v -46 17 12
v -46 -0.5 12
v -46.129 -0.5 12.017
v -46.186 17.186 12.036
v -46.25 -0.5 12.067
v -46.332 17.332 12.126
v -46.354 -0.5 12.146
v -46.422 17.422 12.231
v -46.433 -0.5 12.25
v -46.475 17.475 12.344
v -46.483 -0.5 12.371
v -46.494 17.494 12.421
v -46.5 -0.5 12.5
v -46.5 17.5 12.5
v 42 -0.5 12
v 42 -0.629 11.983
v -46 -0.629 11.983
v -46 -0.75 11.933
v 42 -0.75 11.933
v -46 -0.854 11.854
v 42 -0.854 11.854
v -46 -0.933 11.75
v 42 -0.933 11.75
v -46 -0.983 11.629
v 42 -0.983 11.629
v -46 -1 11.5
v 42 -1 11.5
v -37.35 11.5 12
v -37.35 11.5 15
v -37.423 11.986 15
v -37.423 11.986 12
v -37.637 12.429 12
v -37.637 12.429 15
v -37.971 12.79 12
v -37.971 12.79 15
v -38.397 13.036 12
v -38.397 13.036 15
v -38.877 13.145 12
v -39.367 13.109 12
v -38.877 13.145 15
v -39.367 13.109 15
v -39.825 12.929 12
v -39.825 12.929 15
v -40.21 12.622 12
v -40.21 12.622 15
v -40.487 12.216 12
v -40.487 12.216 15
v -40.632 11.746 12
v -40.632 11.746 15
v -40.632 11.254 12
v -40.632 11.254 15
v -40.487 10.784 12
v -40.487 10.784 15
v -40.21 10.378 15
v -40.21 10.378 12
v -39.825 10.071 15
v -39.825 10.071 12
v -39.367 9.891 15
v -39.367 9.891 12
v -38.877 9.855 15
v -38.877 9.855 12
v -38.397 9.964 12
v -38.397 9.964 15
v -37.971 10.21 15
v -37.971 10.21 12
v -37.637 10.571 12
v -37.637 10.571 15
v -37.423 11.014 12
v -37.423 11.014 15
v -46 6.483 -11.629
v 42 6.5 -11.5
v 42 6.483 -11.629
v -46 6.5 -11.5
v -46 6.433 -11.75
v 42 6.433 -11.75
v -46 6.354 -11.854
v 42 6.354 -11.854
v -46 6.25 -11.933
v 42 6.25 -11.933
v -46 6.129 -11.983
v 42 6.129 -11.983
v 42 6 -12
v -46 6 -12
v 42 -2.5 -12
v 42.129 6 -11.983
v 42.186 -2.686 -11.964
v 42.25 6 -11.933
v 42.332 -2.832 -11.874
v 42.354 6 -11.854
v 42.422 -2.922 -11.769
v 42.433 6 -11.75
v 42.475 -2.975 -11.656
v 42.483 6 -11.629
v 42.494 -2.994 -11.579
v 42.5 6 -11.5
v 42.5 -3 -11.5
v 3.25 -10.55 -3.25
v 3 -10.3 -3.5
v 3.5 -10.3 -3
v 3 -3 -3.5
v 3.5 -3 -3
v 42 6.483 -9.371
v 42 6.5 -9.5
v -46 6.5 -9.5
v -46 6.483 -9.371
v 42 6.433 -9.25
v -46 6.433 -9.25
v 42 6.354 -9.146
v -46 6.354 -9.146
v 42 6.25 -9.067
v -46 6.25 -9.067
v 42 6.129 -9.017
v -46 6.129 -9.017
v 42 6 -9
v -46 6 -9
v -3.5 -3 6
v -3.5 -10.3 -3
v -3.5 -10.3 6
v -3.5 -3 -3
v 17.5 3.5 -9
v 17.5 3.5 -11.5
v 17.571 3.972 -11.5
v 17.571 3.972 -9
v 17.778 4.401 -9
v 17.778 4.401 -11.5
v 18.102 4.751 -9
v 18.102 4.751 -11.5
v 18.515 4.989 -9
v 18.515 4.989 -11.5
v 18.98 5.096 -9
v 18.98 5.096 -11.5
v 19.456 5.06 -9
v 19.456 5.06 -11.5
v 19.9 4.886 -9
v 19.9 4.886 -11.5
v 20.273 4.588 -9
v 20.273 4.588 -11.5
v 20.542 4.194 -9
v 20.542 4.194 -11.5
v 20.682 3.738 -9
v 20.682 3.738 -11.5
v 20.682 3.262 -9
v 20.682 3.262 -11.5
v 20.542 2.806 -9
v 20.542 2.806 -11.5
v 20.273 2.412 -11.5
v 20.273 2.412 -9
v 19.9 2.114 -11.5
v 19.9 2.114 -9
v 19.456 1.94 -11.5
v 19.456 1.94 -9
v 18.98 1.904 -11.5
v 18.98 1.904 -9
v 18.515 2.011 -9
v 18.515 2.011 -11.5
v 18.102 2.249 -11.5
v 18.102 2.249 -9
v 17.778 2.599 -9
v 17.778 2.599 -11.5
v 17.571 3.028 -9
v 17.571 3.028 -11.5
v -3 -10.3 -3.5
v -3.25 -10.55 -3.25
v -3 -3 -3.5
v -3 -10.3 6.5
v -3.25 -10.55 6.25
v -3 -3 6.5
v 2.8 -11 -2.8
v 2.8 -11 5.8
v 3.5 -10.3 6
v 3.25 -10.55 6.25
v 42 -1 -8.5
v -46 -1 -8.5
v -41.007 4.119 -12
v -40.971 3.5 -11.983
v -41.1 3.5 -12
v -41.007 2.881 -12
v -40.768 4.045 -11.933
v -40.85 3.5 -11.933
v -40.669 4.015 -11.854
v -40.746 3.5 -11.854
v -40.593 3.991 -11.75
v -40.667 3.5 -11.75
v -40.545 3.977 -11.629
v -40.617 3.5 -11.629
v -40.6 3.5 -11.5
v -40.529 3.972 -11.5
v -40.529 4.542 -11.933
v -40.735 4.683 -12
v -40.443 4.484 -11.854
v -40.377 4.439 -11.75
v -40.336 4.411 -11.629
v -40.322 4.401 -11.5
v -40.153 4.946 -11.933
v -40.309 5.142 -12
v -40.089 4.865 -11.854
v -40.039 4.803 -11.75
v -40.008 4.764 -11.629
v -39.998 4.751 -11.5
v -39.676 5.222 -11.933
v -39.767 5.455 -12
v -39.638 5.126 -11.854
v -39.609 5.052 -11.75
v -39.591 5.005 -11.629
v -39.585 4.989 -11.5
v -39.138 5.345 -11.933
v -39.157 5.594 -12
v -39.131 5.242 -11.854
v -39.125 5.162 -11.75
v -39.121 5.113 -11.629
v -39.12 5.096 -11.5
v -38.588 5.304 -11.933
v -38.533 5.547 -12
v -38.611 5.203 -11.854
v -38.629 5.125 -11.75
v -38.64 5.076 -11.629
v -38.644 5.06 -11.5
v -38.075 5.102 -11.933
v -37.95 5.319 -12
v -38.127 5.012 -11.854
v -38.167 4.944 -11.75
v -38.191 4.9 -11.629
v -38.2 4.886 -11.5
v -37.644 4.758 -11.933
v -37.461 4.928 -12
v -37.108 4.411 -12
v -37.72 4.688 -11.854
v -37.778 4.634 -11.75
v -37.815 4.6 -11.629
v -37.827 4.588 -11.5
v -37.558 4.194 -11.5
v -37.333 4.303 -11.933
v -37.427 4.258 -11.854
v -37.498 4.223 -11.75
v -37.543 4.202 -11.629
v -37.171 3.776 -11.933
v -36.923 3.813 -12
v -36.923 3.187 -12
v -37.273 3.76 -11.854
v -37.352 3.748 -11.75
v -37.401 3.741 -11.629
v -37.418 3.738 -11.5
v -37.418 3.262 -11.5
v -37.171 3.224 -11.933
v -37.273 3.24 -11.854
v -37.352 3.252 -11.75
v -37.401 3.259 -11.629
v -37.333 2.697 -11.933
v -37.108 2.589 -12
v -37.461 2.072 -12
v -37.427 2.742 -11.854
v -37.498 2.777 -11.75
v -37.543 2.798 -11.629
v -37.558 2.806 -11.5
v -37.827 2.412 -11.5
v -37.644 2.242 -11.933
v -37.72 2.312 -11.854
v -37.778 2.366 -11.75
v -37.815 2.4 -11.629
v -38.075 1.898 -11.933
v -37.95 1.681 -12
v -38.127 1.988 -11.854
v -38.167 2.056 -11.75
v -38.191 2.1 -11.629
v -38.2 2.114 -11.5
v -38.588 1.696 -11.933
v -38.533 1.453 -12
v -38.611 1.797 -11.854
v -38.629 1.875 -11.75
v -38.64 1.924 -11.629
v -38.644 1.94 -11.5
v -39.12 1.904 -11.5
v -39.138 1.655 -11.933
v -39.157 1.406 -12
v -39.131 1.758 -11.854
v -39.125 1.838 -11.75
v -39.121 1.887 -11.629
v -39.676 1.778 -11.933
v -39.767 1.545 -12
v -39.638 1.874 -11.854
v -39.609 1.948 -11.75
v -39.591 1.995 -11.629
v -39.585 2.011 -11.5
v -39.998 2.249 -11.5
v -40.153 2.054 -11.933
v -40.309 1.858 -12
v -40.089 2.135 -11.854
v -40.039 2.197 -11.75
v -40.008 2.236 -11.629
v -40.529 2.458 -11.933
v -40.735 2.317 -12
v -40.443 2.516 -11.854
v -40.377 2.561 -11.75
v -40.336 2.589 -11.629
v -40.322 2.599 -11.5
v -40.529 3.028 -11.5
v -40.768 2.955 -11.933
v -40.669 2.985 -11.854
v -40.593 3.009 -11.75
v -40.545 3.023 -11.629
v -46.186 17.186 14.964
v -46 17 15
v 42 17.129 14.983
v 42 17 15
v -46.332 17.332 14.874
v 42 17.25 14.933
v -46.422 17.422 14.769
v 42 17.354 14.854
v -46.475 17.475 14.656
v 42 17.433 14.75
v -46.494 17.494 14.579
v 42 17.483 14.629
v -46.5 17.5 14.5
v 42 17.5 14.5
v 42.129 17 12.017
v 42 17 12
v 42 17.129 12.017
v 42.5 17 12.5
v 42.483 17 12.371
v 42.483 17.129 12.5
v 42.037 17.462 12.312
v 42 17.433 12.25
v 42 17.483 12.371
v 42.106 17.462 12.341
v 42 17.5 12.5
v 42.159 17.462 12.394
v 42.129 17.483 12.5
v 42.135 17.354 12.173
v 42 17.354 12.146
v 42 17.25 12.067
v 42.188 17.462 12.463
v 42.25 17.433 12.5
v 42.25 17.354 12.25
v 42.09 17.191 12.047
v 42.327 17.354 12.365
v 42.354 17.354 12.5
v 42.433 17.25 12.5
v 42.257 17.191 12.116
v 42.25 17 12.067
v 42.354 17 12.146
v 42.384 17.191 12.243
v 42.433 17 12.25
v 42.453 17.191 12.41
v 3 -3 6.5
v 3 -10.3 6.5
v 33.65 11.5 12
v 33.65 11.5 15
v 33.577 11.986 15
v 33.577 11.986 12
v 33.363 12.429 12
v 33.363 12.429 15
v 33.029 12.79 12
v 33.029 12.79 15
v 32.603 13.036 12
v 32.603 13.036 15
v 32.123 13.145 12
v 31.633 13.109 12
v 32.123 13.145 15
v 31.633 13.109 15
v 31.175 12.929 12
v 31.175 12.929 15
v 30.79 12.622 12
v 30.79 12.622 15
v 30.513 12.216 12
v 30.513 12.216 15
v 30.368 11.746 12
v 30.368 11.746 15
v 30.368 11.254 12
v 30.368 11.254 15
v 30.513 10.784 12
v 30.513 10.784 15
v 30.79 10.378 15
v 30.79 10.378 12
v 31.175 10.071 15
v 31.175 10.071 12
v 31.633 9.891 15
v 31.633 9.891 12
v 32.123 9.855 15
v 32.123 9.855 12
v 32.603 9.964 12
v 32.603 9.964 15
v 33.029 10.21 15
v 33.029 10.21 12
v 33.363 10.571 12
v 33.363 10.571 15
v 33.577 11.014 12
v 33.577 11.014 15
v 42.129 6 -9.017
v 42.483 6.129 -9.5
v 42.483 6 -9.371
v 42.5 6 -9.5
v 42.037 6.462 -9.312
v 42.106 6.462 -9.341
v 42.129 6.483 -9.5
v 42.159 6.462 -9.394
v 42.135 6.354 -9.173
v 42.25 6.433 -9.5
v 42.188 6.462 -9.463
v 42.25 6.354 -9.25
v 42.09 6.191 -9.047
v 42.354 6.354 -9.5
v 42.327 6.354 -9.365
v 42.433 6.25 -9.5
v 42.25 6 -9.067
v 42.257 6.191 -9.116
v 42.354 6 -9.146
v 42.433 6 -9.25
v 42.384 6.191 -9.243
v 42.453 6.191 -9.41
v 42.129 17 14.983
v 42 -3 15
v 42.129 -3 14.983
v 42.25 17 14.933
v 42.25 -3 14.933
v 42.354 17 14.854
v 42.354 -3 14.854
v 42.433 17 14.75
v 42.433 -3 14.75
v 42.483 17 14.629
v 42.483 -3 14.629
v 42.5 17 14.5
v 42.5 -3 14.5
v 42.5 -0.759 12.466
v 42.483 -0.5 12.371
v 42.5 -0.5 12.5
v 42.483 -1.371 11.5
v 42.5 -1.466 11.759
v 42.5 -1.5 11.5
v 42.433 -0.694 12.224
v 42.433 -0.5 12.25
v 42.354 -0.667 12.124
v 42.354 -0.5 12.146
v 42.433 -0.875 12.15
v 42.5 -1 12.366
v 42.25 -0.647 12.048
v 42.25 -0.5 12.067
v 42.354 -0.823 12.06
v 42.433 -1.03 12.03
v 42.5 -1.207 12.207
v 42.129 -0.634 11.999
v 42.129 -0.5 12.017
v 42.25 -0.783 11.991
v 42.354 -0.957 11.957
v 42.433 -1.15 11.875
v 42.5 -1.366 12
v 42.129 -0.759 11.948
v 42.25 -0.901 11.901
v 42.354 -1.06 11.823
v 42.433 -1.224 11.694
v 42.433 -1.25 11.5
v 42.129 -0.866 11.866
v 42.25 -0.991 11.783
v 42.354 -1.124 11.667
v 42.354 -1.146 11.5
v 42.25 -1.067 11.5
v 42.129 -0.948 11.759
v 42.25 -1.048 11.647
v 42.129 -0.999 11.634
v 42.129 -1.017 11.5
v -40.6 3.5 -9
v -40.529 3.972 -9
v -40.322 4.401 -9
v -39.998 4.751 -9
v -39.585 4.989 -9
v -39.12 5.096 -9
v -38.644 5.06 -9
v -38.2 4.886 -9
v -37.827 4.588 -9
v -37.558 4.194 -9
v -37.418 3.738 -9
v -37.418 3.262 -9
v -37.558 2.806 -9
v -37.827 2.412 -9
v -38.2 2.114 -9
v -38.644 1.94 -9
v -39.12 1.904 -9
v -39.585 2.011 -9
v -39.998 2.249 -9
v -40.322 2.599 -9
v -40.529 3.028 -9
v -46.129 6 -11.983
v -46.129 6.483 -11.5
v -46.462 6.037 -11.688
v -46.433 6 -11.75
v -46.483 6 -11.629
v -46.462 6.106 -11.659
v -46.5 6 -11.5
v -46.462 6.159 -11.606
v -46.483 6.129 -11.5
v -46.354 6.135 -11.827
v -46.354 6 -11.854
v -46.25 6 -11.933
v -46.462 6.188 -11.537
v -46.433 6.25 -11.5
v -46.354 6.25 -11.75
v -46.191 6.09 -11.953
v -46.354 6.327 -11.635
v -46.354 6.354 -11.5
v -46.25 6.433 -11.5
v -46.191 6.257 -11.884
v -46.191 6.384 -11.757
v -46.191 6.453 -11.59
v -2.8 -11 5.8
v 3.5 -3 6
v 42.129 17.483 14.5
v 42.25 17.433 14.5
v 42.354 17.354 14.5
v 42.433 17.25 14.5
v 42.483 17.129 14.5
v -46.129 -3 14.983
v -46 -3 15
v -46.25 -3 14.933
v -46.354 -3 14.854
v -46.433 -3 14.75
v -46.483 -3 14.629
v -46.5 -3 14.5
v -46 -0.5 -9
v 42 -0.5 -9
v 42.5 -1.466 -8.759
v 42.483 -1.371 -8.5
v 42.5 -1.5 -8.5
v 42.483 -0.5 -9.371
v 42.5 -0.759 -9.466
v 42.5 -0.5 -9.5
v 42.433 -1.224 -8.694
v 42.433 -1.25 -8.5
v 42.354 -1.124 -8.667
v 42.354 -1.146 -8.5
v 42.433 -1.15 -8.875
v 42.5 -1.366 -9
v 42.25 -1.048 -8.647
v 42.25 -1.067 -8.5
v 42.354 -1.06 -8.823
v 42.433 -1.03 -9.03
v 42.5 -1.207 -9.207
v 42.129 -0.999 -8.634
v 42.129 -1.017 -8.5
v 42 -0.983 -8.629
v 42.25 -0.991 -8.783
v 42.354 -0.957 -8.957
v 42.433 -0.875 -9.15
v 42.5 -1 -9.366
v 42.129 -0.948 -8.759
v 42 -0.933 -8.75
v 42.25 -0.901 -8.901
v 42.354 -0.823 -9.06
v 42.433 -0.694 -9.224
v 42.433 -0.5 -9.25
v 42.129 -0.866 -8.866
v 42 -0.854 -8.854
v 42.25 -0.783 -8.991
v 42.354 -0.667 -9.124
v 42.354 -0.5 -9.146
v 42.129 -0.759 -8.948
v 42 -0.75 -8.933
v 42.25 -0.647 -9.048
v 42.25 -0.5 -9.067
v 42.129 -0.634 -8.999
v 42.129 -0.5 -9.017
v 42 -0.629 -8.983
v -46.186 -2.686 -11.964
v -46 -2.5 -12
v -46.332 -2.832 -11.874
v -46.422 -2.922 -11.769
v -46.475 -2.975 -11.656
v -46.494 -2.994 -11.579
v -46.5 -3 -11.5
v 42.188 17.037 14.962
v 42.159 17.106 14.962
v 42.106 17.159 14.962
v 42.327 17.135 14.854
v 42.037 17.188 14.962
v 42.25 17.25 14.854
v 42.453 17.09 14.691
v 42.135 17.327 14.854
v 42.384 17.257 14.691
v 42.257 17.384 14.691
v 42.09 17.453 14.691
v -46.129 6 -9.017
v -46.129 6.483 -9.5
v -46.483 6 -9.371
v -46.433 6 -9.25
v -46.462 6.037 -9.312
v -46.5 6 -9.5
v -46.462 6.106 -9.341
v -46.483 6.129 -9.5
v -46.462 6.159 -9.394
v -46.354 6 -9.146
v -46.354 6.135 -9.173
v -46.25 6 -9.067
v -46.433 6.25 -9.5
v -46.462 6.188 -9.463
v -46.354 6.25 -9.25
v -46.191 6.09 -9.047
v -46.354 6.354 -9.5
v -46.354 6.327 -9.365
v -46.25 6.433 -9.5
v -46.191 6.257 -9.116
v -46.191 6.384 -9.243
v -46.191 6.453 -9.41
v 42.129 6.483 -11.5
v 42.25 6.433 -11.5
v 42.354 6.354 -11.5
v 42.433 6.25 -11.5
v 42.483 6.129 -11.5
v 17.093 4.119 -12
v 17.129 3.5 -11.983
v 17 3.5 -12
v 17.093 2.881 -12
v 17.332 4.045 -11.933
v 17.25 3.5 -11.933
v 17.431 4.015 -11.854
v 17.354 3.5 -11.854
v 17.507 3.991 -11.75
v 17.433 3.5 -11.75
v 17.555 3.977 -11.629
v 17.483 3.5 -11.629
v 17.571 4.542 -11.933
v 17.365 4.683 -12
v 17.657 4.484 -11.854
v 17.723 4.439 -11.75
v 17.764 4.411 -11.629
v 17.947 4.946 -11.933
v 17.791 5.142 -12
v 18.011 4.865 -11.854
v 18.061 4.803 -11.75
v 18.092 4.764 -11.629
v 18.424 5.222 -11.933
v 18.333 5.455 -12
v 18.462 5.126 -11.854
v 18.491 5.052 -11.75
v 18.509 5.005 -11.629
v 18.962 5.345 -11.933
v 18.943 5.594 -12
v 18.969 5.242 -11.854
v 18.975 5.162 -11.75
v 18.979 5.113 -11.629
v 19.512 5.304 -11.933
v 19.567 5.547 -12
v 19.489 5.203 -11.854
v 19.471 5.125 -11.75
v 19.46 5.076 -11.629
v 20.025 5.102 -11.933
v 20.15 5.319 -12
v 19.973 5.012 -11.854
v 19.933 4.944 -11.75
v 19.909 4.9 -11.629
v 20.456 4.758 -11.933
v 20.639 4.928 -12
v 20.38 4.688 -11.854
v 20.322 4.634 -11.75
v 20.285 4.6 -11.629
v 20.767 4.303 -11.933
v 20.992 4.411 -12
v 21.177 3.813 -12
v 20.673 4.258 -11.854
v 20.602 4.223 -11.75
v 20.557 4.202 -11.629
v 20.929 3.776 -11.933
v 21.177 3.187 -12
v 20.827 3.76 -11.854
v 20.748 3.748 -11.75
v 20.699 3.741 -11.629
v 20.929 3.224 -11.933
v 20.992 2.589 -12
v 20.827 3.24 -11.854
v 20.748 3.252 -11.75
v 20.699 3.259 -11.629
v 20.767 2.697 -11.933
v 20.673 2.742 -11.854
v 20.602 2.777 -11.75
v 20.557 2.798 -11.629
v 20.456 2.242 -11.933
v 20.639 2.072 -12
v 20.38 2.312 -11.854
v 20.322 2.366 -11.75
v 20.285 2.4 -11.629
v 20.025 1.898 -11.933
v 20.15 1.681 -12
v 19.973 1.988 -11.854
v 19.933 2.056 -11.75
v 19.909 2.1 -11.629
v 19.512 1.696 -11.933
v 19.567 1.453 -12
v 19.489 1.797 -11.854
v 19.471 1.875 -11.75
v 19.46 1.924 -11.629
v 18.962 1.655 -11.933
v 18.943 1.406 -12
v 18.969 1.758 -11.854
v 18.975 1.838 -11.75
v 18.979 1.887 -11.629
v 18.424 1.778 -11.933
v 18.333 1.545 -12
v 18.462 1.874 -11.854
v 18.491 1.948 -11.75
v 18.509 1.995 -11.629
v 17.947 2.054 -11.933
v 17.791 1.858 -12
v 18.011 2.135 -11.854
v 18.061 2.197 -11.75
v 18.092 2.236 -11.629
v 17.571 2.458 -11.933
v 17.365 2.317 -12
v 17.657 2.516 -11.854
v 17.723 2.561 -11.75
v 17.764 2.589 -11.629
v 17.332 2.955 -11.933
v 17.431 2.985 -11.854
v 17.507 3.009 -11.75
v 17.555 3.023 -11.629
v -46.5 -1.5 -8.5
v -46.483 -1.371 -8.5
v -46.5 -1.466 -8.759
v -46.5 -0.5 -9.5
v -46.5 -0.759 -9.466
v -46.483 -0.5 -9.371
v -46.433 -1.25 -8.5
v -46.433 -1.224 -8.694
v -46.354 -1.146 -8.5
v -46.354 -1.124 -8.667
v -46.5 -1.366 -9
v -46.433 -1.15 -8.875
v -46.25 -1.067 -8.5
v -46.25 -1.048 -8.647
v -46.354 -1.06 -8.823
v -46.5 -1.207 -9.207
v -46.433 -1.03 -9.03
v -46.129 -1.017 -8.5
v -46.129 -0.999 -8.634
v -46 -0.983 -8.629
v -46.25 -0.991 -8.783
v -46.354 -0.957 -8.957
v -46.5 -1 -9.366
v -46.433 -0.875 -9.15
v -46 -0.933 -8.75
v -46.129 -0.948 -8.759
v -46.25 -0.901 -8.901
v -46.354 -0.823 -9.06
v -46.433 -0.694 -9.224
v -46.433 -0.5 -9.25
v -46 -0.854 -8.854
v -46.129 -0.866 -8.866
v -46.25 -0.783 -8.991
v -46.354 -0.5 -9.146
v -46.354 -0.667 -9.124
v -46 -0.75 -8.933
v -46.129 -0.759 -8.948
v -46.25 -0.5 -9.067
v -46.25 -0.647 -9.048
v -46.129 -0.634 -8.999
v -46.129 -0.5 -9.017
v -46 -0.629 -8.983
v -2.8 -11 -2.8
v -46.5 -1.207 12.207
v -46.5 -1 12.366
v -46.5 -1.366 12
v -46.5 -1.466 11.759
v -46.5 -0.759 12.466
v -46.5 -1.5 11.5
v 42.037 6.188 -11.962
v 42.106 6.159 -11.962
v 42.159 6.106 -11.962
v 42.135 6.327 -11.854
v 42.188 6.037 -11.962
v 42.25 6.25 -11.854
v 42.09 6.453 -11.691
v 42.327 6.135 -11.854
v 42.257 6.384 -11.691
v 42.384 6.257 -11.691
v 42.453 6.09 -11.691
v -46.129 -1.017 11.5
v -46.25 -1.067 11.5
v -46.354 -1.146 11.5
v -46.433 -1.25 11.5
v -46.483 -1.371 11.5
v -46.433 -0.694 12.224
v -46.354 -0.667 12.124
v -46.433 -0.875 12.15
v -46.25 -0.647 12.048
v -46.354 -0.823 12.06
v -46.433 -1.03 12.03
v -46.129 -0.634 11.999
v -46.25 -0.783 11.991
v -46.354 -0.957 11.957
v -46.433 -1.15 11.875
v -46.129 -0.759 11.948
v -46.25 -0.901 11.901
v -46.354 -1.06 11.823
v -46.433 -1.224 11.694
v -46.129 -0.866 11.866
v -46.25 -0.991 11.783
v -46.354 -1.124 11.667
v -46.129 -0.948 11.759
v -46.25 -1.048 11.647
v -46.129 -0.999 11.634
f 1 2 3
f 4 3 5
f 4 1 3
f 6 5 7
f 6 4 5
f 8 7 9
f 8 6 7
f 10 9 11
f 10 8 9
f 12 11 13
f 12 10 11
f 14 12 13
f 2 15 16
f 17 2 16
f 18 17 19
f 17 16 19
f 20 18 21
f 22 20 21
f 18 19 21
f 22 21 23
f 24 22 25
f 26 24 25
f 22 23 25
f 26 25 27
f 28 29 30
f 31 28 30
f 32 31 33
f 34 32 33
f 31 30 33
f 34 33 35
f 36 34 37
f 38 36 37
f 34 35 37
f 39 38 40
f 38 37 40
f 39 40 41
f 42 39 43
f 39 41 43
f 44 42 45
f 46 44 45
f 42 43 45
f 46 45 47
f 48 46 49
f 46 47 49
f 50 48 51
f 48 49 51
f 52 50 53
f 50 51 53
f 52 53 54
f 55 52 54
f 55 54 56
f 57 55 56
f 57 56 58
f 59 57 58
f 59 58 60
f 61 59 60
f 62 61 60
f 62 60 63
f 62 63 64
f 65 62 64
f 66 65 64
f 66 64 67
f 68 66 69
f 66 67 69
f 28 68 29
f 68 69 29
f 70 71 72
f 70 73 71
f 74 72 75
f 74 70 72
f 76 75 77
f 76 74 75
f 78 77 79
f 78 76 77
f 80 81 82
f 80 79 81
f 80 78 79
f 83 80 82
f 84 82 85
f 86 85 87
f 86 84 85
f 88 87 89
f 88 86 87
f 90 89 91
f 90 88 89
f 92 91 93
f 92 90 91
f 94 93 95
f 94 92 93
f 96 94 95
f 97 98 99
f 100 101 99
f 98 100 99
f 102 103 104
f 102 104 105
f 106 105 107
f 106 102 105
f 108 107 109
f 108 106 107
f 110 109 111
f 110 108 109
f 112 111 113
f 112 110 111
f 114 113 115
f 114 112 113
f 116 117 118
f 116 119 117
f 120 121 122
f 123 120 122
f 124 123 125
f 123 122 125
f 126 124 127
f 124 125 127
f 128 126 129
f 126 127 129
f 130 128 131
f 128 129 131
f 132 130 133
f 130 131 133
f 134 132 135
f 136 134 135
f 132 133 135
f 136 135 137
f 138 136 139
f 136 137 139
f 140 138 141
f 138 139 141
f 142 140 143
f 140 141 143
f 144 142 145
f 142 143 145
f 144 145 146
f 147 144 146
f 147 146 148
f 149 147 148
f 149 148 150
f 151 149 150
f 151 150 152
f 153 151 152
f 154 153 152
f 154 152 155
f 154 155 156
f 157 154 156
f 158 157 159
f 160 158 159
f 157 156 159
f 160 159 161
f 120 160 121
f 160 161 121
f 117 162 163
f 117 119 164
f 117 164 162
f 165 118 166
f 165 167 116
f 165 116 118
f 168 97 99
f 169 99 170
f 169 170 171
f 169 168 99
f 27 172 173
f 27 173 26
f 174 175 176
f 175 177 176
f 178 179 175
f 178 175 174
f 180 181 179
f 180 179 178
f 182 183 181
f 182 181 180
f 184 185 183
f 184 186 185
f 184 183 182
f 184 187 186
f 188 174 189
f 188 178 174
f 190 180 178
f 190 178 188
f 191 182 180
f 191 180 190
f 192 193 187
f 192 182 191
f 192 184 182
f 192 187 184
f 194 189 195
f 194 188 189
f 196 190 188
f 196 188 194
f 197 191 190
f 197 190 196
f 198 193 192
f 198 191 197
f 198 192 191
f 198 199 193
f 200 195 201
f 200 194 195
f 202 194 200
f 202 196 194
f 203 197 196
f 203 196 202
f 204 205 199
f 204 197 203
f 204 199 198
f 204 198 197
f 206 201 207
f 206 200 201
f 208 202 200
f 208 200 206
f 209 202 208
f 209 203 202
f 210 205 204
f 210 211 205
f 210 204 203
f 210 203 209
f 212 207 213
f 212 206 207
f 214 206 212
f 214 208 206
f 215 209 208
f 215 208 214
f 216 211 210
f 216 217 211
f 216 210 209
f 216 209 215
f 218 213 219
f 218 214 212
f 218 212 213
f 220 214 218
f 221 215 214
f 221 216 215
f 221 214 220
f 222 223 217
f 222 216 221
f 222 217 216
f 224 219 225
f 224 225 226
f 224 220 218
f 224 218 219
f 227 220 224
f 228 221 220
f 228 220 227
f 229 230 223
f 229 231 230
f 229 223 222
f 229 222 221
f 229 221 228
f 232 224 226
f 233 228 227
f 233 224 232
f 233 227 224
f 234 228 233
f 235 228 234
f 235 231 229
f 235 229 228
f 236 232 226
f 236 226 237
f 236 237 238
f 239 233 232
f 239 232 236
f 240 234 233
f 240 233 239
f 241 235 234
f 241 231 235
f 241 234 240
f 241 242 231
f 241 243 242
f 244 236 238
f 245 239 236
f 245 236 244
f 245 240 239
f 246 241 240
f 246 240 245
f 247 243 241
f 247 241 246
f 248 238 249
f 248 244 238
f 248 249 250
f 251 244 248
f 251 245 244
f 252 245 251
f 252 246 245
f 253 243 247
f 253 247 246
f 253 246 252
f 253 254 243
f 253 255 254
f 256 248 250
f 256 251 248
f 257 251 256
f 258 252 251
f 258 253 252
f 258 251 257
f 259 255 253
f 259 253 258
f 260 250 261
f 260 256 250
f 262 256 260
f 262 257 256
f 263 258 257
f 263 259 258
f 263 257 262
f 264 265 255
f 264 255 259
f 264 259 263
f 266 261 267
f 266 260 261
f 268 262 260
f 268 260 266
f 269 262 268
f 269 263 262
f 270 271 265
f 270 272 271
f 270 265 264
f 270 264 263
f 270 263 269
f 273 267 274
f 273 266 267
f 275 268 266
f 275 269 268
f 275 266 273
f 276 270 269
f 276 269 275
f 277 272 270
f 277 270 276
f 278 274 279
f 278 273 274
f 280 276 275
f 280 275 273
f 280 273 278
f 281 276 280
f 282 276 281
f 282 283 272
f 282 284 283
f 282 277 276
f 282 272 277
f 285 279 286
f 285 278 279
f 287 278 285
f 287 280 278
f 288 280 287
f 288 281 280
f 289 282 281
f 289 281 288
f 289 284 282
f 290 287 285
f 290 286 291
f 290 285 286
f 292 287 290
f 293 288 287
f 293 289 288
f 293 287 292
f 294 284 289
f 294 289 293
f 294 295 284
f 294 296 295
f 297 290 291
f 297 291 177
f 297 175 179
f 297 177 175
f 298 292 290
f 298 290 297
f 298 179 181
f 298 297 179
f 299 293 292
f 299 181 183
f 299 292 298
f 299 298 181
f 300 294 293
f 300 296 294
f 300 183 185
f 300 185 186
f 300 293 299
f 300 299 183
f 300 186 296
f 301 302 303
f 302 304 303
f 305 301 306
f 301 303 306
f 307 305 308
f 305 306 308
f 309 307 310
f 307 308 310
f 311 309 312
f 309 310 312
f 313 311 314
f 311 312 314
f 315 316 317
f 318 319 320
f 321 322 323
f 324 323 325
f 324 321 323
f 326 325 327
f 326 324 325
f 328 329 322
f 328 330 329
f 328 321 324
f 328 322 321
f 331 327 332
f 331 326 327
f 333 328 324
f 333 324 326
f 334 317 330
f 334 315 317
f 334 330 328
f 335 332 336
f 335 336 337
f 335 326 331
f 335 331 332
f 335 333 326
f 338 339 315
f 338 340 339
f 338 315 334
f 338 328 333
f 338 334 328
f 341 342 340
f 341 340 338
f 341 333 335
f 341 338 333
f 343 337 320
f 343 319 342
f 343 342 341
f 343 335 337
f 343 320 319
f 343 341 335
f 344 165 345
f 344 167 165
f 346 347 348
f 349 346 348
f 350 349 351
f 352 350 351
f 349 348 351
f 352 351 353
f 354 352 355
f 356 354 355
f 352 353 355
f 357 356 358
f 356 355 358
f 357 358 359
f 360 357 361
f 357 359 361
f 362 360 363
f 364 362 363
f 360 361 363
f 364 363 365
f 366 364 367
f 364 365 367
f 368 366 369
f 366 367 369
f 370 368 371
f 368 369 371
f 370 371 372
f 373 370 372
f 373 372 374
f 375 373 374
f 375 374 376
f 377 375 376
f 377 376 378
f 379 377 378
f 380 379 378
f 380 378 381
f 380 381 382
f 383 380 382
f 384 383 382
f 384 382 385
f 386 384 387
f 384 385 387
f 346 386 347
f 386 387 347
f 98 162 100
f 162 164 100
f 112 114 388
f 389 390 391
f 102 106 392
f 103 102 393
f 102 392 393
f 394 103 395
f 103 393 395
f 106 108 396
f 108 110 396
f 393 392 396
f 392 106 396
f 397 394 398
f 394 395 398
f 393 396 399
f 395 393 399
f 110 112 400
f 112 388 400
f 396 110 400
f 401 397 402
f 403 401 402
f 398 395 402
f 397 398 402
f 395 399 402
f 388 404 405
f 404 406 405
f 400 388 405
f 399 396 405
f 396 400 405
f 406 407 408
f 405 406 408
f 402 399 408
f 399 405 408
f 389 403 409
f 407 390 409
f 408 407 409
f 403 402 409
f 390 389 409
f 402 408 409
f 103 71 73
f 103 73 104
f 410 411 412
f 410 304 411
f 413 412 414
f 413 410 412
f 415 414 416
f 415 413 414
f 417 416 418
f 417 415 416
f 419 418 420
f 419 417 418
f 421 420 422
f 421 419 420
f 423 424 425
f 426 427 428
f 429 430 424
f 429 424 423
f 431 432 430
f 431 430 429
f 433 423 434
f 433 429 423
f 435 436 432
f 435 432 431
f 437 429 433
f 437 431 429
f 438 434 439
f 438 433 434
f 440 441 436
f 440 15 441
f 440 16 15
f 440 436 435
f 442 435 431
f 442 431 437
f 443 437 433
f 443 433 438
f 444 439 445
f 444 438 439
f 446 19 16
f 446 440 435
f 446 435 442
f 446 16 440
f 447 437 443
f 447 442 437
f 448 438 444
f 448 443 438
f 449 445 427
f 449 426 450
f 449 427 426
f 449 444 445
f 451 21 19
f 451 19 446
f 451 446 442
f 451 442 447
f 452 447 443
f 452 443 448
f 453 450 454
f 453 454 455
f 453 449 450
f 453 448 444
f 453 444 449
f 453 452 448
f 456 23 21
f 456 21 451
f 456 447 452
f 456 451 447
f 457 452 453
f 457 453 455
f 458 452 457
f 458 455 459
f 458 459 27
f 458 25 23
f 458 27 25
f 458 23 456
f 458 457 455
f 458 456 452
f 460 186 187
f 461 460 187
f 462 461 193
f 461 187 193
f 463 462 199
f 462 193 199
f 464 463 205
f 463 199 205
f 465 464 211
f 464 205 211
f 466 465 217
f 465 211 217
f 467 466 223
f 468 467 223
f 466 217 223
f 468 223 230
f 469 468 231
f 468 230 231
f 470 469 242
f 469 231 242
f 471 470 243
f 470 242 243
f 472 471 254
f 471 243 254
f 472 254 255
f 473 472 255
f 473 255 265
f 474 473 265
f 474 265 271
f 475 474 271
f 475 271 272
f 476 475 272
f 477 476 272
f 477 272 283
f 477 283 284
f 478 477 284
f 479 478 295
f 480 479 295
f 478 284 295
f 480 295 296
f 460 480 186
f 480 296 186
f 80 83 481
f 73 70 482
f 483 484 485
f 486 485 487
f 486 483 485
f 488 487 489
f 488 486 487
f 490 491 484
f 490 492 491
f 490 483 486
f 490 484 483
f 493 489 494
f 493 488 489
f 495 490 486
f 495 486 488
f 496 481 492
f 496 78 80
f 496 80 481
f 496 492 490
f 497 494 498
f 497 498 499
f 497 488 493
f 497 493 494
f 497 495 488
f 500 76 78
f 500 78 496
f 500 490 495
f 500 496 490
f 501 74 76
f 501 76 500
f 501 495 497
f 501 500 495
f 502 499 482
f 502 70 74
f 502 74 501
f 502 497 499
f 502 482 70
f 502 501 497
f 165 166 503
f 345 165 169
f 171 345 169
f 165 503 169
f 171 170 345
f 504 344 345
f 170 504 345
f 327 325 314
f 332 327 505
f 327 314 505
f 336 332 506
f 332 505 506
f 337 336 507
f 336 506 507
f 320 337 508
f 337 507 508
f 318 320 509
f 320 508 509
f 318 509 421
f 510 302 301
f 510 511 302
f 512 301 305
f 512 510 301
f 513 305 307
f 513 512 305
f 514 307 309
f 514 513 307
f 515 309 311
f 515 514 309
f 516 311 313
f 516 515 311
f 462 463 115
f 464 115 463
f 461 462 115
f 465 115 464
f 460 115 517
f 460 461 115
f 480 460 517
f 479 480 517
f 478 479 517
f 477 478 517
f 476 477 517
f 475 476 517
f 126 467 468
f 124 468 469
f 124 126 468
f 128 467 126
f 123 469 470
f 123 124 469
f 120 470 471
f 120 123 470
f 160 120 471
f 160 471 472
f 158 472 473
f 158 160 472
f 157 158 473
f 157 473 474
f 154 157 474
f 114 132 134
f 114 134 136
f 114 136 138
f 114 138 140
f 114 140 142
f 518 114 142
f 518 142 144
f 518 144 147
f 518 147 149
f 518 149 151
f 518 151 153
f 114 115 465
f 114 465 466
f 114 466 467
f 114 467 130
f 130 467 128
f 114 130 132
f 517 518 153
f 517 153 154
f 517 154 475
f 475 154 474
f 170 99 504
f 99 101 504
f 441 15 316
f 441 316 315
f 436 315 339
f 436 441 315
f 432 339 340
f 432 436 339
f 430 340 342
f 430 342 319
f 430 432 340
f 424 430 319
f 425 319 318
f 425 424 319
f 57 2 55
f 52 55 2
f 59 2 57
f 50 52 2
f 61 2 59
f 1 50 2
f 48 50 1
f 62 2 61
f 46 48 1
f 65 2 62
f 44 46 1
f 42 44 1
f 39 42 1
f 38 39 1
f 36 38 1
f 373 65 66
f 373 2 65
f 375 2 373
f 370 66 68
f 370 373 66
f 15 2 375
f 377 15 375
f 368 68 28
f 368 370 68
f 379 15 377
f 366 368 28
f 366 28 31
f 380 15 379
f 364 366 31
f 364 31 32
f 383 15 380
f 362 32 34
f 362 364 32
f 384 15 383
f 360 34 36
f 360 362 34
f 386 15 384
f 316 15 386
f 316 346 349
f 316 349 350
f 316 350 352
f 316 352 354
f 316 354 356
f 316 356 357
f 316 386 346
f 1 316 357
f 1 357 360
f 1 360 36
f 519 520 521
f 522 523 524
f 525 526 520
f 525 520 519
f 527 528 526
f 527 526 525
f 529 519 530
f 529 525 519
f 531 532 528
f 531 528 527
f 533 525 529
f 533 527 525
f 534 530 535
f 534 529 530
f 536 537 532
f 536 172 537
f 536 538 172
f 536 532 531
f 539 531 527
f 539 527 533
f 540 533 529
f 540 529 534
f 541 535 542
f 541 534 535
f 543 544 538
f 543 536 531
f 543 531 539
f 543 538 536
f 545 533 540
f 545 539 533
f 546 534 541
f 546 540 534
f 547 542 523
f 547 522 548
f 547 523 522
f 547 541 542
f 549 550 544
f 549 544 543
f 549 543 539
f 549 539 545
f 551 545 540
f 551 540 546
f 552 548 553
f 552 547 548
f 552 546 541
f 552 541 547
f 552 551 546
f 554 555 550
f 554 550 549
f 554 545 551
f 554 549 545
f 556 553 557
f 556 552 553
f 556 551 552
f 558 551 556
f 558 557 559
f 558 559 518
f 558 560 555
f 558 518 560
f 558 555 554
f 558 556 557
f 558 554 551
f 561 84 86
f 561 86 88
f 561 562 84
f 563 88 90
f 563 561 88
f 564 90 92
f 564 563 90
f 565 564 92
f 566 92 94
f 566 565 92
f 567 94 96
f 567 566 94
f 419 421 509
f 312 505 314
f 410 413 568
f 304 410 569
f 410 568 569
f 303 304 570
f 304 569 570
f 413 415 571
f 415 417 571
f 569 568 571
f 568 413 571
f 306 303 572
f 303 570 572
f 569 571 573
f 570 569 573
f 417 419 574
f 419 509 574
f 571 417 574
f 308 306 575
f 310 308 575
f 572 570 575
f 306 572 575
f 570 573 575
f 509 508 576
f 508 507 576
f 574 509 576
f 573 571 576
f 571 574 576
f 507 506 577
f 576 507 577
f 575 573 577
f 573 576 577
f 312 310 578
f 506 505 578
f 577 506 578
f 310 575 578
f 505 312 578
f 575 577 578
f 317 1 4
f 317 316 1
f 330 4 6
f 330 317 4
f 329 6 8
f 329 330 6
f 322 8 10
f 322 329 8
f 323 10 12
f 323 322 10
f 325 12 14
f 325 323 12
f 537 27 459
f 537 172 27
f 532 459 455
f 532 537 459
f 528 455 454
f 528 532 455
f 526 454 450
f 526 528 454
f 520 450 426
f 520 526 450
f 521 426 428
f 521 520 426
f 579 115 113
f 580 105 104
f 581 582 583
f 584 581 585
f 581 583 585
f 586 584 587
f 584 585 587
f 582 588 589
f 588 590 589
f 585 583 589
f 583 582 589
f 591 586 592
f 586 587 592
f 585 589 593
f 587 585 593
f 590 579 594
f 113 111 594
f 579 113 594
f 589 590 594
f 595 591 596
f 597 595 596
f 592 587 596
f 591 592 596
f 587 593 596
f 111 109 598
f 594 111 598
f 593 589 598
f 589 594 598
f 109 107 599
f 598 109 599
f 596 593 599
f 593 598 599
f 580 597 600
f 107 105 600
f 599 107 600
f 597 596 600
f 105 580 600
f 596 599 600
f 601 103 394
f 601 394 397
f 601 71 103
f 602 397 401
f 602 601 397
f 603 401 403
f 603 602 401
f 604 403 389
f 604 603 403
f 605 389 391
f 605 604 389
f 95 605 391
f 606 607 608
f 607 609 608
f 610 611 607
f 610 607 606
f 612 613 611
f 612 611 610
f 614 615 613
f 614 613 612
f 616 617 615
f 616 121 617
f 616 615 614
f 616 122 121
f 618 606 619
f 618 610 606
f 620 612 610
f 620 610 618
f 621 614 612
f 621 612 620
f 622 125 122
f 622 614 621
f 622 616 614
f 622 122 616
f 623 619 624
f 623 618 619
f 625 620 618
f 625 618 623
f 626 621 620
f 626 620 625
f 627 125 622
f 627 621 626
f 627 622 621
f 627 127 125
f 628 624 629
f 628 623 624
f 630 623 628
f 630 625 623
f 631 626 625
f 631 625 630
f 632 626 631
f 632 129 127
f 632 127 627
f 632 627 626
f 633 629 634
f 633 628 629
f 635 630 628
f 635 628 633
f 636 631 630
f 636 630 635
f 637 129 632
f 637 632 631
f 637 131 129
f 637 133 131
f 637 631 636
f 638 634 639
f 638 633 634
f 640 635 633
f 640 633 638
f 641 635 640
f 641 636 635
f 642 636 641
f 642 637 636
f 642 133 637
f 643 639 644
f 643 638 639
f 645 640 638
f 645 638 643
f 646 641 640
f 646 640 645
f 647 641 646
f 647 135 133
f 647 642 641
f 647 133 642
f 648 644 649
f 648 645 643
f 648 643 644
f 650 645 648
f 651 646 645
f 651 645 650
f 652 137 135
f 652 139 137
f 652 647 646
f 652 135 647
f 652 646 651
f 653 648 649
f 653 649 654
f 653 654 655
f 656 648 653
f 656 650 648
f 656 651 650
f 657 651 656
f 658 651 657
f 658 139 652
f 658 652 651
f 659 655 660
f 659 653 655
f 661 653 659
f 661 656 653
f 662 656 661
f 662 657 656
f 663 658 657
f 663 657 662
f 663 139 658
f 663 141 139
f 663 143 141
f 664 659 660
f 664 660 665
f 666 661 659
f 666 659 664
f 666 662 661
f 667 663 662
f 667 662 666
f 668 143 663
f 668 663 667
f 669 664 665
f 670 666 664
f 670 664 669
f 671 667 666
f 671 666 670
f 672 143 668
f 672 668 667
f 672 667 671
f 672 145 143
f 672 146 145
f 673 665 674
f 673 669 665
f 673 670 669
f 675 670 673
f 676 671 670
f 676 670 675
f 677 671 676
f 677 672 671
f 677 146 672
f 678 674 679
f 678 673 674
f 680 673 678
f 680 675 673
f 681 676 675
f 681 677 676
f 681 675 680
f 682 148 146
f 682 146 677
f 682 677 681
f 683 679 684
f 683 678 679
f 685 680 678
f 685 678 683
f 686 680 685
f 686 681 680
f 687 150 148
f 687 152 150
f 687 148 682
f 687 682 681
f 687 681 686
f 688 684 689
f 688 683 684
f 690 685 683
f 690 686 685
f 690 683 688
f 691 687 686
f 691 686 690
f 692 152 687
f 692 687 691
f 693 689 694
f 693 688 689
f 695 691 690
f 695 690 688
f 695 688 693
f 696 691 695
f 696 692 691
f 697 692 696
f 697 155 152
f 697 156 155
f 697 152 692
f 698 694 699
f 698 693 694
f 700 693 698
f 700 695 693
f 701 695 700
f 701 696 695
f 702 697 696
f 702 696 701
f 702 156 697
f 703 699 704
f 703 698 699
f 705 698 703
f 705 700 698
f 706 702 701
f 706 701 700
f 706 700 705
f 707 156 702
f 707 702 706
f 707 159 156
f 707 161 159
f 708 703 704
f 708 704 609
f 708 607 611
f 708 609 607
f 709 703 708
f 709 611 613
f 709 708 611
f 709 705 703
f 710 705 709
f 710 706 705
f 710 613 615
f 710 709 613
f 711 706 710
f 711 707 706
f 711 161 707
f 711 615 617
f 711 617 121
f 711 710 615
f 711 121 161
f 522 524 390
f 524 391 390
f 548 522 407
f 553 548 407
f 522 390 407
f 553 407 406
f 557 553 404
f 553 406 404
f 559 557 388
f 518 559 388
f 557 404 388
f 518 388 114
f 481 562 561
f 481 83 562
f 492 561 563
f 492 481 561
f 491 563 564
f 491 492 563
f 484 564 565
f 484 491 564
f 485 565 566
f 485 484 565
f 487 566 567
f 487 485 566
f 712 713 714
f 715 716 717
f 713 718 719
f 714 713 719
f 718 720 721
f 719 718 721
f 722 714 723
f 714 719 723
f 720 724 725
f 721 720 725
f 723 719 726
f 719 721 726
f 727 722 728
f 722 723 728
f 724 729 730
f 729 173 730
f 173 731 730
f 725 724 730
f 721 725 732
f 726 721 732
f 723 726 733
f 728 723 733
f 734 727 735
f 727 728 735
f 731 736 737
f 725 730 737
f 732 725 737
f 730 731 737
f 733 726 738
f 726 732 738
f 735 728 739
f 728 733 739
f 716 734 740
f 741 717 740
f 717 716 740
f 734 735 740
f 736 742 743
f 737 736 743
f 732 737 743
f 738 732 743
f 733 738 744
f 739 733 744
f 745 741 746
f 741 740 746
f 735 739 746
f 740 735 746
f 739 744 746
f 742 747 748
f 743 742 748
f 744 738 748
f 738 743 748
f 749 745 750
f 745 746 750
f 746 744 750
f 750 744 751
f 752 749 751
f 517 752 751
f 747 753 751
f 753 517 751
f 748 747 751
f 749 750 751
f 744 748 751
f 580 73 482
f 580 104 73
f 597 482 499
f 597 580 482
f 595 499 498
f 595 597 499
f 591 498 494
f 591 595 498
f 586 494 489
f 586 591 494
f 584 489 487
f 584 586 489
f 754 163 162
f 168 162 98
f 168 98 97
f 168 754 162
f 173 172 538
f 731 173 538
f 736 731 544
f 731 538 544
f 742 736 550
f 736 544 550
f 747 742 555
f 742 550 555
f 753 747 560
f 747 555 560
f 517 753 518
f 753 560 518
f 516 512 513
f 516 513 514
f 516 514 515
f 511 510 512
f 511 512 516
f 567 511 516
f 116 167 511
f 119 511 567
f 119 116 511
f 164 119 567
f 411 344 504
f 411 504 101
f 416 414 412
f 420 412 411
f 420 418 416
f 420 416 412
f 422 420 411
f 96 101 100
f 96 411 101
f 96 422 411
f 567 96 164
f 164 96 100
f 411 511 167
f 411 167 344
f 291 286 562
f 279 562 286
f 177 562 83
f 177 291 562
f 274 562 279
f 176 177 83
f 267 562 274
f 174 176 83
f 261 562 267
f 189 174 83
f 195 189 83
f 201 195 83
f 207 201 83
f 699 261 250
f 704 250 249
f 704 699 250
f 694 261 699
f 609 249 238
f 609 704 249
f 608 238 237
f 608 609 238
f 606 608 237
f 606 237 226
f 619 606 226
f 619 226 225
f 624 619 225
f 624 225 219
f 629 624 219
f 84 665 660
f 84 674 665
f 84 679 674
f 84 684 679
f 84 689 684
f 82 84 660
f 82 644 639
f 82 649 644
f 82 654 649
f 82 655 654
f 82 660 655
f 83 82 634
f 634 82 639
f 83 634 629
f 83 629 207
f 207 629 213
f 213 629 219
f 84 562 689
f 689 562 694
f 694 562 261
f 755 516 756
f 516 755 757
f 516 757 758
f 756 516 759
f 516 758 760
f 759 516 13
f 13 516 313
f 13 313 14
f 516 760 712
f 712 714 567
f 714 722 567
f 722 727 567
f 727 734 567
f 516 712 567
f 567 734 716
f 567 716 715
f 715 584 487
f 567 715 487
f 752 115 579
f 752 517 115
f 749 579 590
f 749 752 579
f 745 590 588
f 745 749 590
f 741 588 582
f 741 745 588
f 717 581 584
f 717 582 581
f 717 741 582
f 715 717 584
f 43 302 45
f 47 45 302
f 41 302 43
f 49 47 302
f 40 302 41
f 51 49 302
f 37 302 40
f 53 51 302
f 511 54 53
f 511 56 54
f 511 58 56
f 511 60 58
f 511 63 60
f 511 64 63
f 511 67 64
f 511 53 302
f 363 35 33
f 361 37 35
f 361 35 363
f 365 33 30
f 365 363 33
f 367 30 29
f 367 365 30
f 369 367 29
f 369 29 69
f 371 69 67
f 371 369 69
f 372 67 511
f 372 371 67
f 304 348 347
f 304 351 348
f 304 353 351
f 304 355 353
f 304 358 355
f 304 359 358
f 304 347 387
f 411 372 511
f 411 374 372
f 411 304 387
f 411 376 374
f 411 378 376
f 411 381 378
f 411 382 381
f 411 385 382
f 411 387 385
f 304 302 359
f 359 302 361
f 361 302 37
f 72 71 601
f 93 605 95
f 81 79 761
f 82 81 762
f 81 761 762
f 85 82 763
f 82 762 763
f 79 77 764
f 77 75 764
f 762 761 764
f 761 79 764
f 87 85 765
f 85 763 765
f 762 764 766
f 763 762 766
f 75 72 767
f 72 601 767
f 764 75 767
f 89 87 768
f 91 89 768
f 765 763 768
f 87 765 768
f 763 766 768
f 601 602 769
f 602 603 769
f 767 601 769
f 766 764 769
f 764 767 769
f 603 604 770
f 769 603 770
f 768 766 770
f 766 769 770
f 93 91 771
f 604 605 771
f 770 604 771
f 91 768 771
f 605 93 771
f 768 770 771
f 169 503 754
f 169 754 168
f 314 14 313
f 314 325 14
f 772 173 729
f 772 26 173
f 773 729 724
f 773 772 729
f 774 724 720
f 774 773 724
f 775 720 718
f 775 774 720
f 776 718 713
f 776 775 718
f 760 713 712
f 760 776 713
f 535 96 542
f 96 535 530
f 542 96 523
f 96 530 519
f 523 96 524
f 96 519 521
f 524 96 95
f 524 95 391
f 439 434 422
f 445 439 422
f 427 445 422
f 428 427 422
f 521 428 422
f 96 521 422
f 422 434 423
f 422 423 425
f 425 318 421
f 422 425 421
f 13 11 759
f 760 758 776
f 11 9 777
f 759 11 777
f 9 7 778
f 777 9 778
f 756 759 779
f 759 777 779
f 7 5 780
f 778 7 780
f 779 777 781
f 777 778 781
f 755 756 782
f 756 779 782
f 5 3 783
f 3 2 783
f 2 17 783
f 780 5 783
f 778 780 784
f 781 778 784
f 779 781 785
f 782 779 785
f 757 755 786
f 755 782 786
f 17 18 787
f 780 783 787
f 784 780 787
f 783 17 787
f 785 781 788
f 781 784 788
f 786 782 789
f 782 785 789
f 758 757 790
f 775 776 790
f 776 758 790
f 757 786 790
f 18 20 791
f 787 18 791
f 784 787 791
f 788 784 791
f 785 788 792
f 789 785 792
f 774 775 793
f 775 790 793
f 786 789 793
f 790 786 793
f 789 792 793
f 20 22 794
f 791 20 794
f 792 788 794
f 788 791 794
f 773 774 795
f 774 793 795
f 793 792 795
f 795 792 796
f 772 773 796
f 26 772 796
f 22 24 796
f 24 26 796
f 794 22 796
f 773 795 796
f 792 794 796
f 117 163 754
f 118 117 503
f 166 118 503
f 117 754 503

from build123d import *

# Parameters (mm, degrees)
SKETCH1_W           = 85
SKETCH1_H           = 24
BOSS_EXTRUDE1_DEPTH = 3
SKETCH2_W           = 85
SKETCH2_H           = 17.5
BOSS_EXTRUDE2_DEPTH = 3
SKETCH3_W           = 85
SKETCH3_H           = 3
BOSS_EXTRUDE3_DEPTH = 3.5
SKETCH4_R           = 1.65
CUT_EXTRUDE1_DEPTH  = 3
SKETCH5_R           = 1.6
CUT_EXTRUDE2_DEPTH  = 3
SKETCH6_W           = 85
SKETCH6_H           = 27
BOSS_EXTRUDE4_DEPTH = 3
SKETCH7_W           = 85
SKETCH7_H           = 21
CUT_EXTRUDE3_DEPTH  = 4
BOSS_EXTRUDE5_DEPTH = 4
FILLET4_R           = 0.5
SKETCH9_W           = 7
SKETCH9_H           = 10
BOSS_EXTRUDE6_DEPTH = 8
CHAMFER1_SIZE       = 0.7
CHAMFER2_SIZE       = 0.5


with BuildPart() as part:
    # Sketch1 → Boss-Extrude1 (new body)
    with BuildSketch(Plane(origin=(0, 0, 0), x_dir=(1, 0, 0), z_dir=(0, 1, 0))):
        Rectangle(SKETCH1_W, SKETCH1_H)
    extrude(amount=BOSS_EXTRUDE1_DEPTH)

    # Sketch2 → Boss-Extrude2 (add)
    with BuildSketch(Plane.XY.offset(12)):
        with Locations((0, 8.75)):
            Rectangle(SKETCH2_W, SKETCH2_H)
    extrude(amount=BOSS_EXTRUDE2_DEPTH)

    # Sketch3 → Boss-Extrude3 (add)
    with BuildSketch(Plane(origin=(0, 3, 0), x_dir=(1, 0, 0), z_dir=(0, 1, 0))):
        with Locations((0, 10.5)):
            Rectangle(SKETCH3_W, SKETCH3_H)
    extrude(amount=BOSS_EXTRUDE3_DEPTH)

    # Sketch4 → Cut-Extrude1 (cut)
    with BuildSketch(Plane.XY.offset(15)):
        with Locations((-39, 11.5)):
            Circle(SKETCH4_R)
        with Locations((32, 11.5)):
            Circle(SKETCH4_R)
    extrude(amount=-CUT_EXTRUDE1_DEPTH, mode=Mode.SUBTRACT)

    # Sketch5 → Cut-Extrude2 (cut)
    with BuildSketch(Plane(origin=(0, 0, -12), x_dir=(-1, 0, 0), z_dir=(0, 0, -1))):
        with Locations((39, 3.5)):
            Circle(SKETCH5_R)
        with Locations((-19.1, 3.5)):
            Circle(SKETCH5_R)
    extrude(amount=-CUT_EXTRUDE2_DEPTH, mode=Mode.SUBTRACT)

    # Sketch6 → Boss-Extrude4 (add)
    with BuildSketch(Plane.XZ):
        with Locations((0, 1.5)):
            Rectangle(SKETCH6_W, SKETCH6_H)
    extrude(amount=BOSS_EXTRUDE4_DEPTH)

    # Sketch7 → Cut-Extrude3 (cut)
    with BuildSketch(Plane(origin=(0, 3, 0), x_dir=(1, 0, 0), z_dir=(0, 1, 0))):
        with Locations((0, -1.5)):
            Rectangle(SKETCH7_W, SKETCH7_H)
    extrude(amount=-CUT_EXTRUDE3_DEPTH, mode=Mode.SUBTRACT)

    # Sketch8 → Boss-Extrude5 (add)
    with BuildSketch(Plane.ZY.offset(42.5)):
        Polygon((-12, 6.5), (-9, 6.5), (-9, -1), (12, -1), (12, 17.5), (15, 17.5), (15, -3), (-12, -3), align=None)
    extrude(amount=BOSS_EXTRUDE5_DEPTH)

    # Fillet4
    fillet4_edges = [part.edges().sort_by_distance(p)[0] for p in [
        (42.5, 8.25, 12),
        (-2, 17.5, 12),
        (42.5, 17.5, 13.5),
        (42.5, 7.25, 15),
        (-2, 17.5, 15),
        (42.5, 2.75, -9),
        (-2, 6.5, -9),
        (42.5, 6.5, -10.5),
        (-2, 6.5, -12),
        (-37.4, 3.5, -12),
        (20.7, 3.5, -12),
        (-2, -3, -12),
        (-2, -1, -9),
        (42.5, -1, 1.5),
        (-2, -1, 12),
        (42.5, 1.75, -12),
        (-46.5, 1.75, -12),
        (-46.5, 7.25, 15),
        (-46.5, 8.25, 12),
        (-46.5, -1, 1.5),
        (-46.5, 2.75, -9),
        (-46.5, 6.5, -10.5),
    ]]
    fillet(fillet4_edges, radius=FILLET4_R)

    # Sketch9 → Boss-Extrude6 (add)
    with BuildSketch(Plane.XZ.offset(3)):
        with Locations((0, 1.5)):
            Rectangle(SKETCH9_W, SKETCH9_H)
    extrude(amount=BOSS_EXTRUDE6_DEPTH)

    # Chamfer1
    chamfer1_edges = [part.edges().sort_by_distance(p)[0] for p in [
        (3.5, -11, 1.5),
        (0, -11, 6.5),
        (-3.5, -11, 1.5),
        (0, -11, -3.5),
    ]]
    chamfer(chamfer1_edges, length=CHAMFER1_SIZE)

    # Chamfer2
    chamfer2_edges = [part.edges().sort_by_distance(p)[0] for p in [
        (3.5, -6.65, -3.5),
        (-3.5, -6.65, -3.5),
        (-3.5, -6.65, 6.5),
        (3.5, -6.65, 6.5),
    ]]
    chamfer(chamfer2_edges, length=CHAMFER2_SIZE)


solid = part.part
